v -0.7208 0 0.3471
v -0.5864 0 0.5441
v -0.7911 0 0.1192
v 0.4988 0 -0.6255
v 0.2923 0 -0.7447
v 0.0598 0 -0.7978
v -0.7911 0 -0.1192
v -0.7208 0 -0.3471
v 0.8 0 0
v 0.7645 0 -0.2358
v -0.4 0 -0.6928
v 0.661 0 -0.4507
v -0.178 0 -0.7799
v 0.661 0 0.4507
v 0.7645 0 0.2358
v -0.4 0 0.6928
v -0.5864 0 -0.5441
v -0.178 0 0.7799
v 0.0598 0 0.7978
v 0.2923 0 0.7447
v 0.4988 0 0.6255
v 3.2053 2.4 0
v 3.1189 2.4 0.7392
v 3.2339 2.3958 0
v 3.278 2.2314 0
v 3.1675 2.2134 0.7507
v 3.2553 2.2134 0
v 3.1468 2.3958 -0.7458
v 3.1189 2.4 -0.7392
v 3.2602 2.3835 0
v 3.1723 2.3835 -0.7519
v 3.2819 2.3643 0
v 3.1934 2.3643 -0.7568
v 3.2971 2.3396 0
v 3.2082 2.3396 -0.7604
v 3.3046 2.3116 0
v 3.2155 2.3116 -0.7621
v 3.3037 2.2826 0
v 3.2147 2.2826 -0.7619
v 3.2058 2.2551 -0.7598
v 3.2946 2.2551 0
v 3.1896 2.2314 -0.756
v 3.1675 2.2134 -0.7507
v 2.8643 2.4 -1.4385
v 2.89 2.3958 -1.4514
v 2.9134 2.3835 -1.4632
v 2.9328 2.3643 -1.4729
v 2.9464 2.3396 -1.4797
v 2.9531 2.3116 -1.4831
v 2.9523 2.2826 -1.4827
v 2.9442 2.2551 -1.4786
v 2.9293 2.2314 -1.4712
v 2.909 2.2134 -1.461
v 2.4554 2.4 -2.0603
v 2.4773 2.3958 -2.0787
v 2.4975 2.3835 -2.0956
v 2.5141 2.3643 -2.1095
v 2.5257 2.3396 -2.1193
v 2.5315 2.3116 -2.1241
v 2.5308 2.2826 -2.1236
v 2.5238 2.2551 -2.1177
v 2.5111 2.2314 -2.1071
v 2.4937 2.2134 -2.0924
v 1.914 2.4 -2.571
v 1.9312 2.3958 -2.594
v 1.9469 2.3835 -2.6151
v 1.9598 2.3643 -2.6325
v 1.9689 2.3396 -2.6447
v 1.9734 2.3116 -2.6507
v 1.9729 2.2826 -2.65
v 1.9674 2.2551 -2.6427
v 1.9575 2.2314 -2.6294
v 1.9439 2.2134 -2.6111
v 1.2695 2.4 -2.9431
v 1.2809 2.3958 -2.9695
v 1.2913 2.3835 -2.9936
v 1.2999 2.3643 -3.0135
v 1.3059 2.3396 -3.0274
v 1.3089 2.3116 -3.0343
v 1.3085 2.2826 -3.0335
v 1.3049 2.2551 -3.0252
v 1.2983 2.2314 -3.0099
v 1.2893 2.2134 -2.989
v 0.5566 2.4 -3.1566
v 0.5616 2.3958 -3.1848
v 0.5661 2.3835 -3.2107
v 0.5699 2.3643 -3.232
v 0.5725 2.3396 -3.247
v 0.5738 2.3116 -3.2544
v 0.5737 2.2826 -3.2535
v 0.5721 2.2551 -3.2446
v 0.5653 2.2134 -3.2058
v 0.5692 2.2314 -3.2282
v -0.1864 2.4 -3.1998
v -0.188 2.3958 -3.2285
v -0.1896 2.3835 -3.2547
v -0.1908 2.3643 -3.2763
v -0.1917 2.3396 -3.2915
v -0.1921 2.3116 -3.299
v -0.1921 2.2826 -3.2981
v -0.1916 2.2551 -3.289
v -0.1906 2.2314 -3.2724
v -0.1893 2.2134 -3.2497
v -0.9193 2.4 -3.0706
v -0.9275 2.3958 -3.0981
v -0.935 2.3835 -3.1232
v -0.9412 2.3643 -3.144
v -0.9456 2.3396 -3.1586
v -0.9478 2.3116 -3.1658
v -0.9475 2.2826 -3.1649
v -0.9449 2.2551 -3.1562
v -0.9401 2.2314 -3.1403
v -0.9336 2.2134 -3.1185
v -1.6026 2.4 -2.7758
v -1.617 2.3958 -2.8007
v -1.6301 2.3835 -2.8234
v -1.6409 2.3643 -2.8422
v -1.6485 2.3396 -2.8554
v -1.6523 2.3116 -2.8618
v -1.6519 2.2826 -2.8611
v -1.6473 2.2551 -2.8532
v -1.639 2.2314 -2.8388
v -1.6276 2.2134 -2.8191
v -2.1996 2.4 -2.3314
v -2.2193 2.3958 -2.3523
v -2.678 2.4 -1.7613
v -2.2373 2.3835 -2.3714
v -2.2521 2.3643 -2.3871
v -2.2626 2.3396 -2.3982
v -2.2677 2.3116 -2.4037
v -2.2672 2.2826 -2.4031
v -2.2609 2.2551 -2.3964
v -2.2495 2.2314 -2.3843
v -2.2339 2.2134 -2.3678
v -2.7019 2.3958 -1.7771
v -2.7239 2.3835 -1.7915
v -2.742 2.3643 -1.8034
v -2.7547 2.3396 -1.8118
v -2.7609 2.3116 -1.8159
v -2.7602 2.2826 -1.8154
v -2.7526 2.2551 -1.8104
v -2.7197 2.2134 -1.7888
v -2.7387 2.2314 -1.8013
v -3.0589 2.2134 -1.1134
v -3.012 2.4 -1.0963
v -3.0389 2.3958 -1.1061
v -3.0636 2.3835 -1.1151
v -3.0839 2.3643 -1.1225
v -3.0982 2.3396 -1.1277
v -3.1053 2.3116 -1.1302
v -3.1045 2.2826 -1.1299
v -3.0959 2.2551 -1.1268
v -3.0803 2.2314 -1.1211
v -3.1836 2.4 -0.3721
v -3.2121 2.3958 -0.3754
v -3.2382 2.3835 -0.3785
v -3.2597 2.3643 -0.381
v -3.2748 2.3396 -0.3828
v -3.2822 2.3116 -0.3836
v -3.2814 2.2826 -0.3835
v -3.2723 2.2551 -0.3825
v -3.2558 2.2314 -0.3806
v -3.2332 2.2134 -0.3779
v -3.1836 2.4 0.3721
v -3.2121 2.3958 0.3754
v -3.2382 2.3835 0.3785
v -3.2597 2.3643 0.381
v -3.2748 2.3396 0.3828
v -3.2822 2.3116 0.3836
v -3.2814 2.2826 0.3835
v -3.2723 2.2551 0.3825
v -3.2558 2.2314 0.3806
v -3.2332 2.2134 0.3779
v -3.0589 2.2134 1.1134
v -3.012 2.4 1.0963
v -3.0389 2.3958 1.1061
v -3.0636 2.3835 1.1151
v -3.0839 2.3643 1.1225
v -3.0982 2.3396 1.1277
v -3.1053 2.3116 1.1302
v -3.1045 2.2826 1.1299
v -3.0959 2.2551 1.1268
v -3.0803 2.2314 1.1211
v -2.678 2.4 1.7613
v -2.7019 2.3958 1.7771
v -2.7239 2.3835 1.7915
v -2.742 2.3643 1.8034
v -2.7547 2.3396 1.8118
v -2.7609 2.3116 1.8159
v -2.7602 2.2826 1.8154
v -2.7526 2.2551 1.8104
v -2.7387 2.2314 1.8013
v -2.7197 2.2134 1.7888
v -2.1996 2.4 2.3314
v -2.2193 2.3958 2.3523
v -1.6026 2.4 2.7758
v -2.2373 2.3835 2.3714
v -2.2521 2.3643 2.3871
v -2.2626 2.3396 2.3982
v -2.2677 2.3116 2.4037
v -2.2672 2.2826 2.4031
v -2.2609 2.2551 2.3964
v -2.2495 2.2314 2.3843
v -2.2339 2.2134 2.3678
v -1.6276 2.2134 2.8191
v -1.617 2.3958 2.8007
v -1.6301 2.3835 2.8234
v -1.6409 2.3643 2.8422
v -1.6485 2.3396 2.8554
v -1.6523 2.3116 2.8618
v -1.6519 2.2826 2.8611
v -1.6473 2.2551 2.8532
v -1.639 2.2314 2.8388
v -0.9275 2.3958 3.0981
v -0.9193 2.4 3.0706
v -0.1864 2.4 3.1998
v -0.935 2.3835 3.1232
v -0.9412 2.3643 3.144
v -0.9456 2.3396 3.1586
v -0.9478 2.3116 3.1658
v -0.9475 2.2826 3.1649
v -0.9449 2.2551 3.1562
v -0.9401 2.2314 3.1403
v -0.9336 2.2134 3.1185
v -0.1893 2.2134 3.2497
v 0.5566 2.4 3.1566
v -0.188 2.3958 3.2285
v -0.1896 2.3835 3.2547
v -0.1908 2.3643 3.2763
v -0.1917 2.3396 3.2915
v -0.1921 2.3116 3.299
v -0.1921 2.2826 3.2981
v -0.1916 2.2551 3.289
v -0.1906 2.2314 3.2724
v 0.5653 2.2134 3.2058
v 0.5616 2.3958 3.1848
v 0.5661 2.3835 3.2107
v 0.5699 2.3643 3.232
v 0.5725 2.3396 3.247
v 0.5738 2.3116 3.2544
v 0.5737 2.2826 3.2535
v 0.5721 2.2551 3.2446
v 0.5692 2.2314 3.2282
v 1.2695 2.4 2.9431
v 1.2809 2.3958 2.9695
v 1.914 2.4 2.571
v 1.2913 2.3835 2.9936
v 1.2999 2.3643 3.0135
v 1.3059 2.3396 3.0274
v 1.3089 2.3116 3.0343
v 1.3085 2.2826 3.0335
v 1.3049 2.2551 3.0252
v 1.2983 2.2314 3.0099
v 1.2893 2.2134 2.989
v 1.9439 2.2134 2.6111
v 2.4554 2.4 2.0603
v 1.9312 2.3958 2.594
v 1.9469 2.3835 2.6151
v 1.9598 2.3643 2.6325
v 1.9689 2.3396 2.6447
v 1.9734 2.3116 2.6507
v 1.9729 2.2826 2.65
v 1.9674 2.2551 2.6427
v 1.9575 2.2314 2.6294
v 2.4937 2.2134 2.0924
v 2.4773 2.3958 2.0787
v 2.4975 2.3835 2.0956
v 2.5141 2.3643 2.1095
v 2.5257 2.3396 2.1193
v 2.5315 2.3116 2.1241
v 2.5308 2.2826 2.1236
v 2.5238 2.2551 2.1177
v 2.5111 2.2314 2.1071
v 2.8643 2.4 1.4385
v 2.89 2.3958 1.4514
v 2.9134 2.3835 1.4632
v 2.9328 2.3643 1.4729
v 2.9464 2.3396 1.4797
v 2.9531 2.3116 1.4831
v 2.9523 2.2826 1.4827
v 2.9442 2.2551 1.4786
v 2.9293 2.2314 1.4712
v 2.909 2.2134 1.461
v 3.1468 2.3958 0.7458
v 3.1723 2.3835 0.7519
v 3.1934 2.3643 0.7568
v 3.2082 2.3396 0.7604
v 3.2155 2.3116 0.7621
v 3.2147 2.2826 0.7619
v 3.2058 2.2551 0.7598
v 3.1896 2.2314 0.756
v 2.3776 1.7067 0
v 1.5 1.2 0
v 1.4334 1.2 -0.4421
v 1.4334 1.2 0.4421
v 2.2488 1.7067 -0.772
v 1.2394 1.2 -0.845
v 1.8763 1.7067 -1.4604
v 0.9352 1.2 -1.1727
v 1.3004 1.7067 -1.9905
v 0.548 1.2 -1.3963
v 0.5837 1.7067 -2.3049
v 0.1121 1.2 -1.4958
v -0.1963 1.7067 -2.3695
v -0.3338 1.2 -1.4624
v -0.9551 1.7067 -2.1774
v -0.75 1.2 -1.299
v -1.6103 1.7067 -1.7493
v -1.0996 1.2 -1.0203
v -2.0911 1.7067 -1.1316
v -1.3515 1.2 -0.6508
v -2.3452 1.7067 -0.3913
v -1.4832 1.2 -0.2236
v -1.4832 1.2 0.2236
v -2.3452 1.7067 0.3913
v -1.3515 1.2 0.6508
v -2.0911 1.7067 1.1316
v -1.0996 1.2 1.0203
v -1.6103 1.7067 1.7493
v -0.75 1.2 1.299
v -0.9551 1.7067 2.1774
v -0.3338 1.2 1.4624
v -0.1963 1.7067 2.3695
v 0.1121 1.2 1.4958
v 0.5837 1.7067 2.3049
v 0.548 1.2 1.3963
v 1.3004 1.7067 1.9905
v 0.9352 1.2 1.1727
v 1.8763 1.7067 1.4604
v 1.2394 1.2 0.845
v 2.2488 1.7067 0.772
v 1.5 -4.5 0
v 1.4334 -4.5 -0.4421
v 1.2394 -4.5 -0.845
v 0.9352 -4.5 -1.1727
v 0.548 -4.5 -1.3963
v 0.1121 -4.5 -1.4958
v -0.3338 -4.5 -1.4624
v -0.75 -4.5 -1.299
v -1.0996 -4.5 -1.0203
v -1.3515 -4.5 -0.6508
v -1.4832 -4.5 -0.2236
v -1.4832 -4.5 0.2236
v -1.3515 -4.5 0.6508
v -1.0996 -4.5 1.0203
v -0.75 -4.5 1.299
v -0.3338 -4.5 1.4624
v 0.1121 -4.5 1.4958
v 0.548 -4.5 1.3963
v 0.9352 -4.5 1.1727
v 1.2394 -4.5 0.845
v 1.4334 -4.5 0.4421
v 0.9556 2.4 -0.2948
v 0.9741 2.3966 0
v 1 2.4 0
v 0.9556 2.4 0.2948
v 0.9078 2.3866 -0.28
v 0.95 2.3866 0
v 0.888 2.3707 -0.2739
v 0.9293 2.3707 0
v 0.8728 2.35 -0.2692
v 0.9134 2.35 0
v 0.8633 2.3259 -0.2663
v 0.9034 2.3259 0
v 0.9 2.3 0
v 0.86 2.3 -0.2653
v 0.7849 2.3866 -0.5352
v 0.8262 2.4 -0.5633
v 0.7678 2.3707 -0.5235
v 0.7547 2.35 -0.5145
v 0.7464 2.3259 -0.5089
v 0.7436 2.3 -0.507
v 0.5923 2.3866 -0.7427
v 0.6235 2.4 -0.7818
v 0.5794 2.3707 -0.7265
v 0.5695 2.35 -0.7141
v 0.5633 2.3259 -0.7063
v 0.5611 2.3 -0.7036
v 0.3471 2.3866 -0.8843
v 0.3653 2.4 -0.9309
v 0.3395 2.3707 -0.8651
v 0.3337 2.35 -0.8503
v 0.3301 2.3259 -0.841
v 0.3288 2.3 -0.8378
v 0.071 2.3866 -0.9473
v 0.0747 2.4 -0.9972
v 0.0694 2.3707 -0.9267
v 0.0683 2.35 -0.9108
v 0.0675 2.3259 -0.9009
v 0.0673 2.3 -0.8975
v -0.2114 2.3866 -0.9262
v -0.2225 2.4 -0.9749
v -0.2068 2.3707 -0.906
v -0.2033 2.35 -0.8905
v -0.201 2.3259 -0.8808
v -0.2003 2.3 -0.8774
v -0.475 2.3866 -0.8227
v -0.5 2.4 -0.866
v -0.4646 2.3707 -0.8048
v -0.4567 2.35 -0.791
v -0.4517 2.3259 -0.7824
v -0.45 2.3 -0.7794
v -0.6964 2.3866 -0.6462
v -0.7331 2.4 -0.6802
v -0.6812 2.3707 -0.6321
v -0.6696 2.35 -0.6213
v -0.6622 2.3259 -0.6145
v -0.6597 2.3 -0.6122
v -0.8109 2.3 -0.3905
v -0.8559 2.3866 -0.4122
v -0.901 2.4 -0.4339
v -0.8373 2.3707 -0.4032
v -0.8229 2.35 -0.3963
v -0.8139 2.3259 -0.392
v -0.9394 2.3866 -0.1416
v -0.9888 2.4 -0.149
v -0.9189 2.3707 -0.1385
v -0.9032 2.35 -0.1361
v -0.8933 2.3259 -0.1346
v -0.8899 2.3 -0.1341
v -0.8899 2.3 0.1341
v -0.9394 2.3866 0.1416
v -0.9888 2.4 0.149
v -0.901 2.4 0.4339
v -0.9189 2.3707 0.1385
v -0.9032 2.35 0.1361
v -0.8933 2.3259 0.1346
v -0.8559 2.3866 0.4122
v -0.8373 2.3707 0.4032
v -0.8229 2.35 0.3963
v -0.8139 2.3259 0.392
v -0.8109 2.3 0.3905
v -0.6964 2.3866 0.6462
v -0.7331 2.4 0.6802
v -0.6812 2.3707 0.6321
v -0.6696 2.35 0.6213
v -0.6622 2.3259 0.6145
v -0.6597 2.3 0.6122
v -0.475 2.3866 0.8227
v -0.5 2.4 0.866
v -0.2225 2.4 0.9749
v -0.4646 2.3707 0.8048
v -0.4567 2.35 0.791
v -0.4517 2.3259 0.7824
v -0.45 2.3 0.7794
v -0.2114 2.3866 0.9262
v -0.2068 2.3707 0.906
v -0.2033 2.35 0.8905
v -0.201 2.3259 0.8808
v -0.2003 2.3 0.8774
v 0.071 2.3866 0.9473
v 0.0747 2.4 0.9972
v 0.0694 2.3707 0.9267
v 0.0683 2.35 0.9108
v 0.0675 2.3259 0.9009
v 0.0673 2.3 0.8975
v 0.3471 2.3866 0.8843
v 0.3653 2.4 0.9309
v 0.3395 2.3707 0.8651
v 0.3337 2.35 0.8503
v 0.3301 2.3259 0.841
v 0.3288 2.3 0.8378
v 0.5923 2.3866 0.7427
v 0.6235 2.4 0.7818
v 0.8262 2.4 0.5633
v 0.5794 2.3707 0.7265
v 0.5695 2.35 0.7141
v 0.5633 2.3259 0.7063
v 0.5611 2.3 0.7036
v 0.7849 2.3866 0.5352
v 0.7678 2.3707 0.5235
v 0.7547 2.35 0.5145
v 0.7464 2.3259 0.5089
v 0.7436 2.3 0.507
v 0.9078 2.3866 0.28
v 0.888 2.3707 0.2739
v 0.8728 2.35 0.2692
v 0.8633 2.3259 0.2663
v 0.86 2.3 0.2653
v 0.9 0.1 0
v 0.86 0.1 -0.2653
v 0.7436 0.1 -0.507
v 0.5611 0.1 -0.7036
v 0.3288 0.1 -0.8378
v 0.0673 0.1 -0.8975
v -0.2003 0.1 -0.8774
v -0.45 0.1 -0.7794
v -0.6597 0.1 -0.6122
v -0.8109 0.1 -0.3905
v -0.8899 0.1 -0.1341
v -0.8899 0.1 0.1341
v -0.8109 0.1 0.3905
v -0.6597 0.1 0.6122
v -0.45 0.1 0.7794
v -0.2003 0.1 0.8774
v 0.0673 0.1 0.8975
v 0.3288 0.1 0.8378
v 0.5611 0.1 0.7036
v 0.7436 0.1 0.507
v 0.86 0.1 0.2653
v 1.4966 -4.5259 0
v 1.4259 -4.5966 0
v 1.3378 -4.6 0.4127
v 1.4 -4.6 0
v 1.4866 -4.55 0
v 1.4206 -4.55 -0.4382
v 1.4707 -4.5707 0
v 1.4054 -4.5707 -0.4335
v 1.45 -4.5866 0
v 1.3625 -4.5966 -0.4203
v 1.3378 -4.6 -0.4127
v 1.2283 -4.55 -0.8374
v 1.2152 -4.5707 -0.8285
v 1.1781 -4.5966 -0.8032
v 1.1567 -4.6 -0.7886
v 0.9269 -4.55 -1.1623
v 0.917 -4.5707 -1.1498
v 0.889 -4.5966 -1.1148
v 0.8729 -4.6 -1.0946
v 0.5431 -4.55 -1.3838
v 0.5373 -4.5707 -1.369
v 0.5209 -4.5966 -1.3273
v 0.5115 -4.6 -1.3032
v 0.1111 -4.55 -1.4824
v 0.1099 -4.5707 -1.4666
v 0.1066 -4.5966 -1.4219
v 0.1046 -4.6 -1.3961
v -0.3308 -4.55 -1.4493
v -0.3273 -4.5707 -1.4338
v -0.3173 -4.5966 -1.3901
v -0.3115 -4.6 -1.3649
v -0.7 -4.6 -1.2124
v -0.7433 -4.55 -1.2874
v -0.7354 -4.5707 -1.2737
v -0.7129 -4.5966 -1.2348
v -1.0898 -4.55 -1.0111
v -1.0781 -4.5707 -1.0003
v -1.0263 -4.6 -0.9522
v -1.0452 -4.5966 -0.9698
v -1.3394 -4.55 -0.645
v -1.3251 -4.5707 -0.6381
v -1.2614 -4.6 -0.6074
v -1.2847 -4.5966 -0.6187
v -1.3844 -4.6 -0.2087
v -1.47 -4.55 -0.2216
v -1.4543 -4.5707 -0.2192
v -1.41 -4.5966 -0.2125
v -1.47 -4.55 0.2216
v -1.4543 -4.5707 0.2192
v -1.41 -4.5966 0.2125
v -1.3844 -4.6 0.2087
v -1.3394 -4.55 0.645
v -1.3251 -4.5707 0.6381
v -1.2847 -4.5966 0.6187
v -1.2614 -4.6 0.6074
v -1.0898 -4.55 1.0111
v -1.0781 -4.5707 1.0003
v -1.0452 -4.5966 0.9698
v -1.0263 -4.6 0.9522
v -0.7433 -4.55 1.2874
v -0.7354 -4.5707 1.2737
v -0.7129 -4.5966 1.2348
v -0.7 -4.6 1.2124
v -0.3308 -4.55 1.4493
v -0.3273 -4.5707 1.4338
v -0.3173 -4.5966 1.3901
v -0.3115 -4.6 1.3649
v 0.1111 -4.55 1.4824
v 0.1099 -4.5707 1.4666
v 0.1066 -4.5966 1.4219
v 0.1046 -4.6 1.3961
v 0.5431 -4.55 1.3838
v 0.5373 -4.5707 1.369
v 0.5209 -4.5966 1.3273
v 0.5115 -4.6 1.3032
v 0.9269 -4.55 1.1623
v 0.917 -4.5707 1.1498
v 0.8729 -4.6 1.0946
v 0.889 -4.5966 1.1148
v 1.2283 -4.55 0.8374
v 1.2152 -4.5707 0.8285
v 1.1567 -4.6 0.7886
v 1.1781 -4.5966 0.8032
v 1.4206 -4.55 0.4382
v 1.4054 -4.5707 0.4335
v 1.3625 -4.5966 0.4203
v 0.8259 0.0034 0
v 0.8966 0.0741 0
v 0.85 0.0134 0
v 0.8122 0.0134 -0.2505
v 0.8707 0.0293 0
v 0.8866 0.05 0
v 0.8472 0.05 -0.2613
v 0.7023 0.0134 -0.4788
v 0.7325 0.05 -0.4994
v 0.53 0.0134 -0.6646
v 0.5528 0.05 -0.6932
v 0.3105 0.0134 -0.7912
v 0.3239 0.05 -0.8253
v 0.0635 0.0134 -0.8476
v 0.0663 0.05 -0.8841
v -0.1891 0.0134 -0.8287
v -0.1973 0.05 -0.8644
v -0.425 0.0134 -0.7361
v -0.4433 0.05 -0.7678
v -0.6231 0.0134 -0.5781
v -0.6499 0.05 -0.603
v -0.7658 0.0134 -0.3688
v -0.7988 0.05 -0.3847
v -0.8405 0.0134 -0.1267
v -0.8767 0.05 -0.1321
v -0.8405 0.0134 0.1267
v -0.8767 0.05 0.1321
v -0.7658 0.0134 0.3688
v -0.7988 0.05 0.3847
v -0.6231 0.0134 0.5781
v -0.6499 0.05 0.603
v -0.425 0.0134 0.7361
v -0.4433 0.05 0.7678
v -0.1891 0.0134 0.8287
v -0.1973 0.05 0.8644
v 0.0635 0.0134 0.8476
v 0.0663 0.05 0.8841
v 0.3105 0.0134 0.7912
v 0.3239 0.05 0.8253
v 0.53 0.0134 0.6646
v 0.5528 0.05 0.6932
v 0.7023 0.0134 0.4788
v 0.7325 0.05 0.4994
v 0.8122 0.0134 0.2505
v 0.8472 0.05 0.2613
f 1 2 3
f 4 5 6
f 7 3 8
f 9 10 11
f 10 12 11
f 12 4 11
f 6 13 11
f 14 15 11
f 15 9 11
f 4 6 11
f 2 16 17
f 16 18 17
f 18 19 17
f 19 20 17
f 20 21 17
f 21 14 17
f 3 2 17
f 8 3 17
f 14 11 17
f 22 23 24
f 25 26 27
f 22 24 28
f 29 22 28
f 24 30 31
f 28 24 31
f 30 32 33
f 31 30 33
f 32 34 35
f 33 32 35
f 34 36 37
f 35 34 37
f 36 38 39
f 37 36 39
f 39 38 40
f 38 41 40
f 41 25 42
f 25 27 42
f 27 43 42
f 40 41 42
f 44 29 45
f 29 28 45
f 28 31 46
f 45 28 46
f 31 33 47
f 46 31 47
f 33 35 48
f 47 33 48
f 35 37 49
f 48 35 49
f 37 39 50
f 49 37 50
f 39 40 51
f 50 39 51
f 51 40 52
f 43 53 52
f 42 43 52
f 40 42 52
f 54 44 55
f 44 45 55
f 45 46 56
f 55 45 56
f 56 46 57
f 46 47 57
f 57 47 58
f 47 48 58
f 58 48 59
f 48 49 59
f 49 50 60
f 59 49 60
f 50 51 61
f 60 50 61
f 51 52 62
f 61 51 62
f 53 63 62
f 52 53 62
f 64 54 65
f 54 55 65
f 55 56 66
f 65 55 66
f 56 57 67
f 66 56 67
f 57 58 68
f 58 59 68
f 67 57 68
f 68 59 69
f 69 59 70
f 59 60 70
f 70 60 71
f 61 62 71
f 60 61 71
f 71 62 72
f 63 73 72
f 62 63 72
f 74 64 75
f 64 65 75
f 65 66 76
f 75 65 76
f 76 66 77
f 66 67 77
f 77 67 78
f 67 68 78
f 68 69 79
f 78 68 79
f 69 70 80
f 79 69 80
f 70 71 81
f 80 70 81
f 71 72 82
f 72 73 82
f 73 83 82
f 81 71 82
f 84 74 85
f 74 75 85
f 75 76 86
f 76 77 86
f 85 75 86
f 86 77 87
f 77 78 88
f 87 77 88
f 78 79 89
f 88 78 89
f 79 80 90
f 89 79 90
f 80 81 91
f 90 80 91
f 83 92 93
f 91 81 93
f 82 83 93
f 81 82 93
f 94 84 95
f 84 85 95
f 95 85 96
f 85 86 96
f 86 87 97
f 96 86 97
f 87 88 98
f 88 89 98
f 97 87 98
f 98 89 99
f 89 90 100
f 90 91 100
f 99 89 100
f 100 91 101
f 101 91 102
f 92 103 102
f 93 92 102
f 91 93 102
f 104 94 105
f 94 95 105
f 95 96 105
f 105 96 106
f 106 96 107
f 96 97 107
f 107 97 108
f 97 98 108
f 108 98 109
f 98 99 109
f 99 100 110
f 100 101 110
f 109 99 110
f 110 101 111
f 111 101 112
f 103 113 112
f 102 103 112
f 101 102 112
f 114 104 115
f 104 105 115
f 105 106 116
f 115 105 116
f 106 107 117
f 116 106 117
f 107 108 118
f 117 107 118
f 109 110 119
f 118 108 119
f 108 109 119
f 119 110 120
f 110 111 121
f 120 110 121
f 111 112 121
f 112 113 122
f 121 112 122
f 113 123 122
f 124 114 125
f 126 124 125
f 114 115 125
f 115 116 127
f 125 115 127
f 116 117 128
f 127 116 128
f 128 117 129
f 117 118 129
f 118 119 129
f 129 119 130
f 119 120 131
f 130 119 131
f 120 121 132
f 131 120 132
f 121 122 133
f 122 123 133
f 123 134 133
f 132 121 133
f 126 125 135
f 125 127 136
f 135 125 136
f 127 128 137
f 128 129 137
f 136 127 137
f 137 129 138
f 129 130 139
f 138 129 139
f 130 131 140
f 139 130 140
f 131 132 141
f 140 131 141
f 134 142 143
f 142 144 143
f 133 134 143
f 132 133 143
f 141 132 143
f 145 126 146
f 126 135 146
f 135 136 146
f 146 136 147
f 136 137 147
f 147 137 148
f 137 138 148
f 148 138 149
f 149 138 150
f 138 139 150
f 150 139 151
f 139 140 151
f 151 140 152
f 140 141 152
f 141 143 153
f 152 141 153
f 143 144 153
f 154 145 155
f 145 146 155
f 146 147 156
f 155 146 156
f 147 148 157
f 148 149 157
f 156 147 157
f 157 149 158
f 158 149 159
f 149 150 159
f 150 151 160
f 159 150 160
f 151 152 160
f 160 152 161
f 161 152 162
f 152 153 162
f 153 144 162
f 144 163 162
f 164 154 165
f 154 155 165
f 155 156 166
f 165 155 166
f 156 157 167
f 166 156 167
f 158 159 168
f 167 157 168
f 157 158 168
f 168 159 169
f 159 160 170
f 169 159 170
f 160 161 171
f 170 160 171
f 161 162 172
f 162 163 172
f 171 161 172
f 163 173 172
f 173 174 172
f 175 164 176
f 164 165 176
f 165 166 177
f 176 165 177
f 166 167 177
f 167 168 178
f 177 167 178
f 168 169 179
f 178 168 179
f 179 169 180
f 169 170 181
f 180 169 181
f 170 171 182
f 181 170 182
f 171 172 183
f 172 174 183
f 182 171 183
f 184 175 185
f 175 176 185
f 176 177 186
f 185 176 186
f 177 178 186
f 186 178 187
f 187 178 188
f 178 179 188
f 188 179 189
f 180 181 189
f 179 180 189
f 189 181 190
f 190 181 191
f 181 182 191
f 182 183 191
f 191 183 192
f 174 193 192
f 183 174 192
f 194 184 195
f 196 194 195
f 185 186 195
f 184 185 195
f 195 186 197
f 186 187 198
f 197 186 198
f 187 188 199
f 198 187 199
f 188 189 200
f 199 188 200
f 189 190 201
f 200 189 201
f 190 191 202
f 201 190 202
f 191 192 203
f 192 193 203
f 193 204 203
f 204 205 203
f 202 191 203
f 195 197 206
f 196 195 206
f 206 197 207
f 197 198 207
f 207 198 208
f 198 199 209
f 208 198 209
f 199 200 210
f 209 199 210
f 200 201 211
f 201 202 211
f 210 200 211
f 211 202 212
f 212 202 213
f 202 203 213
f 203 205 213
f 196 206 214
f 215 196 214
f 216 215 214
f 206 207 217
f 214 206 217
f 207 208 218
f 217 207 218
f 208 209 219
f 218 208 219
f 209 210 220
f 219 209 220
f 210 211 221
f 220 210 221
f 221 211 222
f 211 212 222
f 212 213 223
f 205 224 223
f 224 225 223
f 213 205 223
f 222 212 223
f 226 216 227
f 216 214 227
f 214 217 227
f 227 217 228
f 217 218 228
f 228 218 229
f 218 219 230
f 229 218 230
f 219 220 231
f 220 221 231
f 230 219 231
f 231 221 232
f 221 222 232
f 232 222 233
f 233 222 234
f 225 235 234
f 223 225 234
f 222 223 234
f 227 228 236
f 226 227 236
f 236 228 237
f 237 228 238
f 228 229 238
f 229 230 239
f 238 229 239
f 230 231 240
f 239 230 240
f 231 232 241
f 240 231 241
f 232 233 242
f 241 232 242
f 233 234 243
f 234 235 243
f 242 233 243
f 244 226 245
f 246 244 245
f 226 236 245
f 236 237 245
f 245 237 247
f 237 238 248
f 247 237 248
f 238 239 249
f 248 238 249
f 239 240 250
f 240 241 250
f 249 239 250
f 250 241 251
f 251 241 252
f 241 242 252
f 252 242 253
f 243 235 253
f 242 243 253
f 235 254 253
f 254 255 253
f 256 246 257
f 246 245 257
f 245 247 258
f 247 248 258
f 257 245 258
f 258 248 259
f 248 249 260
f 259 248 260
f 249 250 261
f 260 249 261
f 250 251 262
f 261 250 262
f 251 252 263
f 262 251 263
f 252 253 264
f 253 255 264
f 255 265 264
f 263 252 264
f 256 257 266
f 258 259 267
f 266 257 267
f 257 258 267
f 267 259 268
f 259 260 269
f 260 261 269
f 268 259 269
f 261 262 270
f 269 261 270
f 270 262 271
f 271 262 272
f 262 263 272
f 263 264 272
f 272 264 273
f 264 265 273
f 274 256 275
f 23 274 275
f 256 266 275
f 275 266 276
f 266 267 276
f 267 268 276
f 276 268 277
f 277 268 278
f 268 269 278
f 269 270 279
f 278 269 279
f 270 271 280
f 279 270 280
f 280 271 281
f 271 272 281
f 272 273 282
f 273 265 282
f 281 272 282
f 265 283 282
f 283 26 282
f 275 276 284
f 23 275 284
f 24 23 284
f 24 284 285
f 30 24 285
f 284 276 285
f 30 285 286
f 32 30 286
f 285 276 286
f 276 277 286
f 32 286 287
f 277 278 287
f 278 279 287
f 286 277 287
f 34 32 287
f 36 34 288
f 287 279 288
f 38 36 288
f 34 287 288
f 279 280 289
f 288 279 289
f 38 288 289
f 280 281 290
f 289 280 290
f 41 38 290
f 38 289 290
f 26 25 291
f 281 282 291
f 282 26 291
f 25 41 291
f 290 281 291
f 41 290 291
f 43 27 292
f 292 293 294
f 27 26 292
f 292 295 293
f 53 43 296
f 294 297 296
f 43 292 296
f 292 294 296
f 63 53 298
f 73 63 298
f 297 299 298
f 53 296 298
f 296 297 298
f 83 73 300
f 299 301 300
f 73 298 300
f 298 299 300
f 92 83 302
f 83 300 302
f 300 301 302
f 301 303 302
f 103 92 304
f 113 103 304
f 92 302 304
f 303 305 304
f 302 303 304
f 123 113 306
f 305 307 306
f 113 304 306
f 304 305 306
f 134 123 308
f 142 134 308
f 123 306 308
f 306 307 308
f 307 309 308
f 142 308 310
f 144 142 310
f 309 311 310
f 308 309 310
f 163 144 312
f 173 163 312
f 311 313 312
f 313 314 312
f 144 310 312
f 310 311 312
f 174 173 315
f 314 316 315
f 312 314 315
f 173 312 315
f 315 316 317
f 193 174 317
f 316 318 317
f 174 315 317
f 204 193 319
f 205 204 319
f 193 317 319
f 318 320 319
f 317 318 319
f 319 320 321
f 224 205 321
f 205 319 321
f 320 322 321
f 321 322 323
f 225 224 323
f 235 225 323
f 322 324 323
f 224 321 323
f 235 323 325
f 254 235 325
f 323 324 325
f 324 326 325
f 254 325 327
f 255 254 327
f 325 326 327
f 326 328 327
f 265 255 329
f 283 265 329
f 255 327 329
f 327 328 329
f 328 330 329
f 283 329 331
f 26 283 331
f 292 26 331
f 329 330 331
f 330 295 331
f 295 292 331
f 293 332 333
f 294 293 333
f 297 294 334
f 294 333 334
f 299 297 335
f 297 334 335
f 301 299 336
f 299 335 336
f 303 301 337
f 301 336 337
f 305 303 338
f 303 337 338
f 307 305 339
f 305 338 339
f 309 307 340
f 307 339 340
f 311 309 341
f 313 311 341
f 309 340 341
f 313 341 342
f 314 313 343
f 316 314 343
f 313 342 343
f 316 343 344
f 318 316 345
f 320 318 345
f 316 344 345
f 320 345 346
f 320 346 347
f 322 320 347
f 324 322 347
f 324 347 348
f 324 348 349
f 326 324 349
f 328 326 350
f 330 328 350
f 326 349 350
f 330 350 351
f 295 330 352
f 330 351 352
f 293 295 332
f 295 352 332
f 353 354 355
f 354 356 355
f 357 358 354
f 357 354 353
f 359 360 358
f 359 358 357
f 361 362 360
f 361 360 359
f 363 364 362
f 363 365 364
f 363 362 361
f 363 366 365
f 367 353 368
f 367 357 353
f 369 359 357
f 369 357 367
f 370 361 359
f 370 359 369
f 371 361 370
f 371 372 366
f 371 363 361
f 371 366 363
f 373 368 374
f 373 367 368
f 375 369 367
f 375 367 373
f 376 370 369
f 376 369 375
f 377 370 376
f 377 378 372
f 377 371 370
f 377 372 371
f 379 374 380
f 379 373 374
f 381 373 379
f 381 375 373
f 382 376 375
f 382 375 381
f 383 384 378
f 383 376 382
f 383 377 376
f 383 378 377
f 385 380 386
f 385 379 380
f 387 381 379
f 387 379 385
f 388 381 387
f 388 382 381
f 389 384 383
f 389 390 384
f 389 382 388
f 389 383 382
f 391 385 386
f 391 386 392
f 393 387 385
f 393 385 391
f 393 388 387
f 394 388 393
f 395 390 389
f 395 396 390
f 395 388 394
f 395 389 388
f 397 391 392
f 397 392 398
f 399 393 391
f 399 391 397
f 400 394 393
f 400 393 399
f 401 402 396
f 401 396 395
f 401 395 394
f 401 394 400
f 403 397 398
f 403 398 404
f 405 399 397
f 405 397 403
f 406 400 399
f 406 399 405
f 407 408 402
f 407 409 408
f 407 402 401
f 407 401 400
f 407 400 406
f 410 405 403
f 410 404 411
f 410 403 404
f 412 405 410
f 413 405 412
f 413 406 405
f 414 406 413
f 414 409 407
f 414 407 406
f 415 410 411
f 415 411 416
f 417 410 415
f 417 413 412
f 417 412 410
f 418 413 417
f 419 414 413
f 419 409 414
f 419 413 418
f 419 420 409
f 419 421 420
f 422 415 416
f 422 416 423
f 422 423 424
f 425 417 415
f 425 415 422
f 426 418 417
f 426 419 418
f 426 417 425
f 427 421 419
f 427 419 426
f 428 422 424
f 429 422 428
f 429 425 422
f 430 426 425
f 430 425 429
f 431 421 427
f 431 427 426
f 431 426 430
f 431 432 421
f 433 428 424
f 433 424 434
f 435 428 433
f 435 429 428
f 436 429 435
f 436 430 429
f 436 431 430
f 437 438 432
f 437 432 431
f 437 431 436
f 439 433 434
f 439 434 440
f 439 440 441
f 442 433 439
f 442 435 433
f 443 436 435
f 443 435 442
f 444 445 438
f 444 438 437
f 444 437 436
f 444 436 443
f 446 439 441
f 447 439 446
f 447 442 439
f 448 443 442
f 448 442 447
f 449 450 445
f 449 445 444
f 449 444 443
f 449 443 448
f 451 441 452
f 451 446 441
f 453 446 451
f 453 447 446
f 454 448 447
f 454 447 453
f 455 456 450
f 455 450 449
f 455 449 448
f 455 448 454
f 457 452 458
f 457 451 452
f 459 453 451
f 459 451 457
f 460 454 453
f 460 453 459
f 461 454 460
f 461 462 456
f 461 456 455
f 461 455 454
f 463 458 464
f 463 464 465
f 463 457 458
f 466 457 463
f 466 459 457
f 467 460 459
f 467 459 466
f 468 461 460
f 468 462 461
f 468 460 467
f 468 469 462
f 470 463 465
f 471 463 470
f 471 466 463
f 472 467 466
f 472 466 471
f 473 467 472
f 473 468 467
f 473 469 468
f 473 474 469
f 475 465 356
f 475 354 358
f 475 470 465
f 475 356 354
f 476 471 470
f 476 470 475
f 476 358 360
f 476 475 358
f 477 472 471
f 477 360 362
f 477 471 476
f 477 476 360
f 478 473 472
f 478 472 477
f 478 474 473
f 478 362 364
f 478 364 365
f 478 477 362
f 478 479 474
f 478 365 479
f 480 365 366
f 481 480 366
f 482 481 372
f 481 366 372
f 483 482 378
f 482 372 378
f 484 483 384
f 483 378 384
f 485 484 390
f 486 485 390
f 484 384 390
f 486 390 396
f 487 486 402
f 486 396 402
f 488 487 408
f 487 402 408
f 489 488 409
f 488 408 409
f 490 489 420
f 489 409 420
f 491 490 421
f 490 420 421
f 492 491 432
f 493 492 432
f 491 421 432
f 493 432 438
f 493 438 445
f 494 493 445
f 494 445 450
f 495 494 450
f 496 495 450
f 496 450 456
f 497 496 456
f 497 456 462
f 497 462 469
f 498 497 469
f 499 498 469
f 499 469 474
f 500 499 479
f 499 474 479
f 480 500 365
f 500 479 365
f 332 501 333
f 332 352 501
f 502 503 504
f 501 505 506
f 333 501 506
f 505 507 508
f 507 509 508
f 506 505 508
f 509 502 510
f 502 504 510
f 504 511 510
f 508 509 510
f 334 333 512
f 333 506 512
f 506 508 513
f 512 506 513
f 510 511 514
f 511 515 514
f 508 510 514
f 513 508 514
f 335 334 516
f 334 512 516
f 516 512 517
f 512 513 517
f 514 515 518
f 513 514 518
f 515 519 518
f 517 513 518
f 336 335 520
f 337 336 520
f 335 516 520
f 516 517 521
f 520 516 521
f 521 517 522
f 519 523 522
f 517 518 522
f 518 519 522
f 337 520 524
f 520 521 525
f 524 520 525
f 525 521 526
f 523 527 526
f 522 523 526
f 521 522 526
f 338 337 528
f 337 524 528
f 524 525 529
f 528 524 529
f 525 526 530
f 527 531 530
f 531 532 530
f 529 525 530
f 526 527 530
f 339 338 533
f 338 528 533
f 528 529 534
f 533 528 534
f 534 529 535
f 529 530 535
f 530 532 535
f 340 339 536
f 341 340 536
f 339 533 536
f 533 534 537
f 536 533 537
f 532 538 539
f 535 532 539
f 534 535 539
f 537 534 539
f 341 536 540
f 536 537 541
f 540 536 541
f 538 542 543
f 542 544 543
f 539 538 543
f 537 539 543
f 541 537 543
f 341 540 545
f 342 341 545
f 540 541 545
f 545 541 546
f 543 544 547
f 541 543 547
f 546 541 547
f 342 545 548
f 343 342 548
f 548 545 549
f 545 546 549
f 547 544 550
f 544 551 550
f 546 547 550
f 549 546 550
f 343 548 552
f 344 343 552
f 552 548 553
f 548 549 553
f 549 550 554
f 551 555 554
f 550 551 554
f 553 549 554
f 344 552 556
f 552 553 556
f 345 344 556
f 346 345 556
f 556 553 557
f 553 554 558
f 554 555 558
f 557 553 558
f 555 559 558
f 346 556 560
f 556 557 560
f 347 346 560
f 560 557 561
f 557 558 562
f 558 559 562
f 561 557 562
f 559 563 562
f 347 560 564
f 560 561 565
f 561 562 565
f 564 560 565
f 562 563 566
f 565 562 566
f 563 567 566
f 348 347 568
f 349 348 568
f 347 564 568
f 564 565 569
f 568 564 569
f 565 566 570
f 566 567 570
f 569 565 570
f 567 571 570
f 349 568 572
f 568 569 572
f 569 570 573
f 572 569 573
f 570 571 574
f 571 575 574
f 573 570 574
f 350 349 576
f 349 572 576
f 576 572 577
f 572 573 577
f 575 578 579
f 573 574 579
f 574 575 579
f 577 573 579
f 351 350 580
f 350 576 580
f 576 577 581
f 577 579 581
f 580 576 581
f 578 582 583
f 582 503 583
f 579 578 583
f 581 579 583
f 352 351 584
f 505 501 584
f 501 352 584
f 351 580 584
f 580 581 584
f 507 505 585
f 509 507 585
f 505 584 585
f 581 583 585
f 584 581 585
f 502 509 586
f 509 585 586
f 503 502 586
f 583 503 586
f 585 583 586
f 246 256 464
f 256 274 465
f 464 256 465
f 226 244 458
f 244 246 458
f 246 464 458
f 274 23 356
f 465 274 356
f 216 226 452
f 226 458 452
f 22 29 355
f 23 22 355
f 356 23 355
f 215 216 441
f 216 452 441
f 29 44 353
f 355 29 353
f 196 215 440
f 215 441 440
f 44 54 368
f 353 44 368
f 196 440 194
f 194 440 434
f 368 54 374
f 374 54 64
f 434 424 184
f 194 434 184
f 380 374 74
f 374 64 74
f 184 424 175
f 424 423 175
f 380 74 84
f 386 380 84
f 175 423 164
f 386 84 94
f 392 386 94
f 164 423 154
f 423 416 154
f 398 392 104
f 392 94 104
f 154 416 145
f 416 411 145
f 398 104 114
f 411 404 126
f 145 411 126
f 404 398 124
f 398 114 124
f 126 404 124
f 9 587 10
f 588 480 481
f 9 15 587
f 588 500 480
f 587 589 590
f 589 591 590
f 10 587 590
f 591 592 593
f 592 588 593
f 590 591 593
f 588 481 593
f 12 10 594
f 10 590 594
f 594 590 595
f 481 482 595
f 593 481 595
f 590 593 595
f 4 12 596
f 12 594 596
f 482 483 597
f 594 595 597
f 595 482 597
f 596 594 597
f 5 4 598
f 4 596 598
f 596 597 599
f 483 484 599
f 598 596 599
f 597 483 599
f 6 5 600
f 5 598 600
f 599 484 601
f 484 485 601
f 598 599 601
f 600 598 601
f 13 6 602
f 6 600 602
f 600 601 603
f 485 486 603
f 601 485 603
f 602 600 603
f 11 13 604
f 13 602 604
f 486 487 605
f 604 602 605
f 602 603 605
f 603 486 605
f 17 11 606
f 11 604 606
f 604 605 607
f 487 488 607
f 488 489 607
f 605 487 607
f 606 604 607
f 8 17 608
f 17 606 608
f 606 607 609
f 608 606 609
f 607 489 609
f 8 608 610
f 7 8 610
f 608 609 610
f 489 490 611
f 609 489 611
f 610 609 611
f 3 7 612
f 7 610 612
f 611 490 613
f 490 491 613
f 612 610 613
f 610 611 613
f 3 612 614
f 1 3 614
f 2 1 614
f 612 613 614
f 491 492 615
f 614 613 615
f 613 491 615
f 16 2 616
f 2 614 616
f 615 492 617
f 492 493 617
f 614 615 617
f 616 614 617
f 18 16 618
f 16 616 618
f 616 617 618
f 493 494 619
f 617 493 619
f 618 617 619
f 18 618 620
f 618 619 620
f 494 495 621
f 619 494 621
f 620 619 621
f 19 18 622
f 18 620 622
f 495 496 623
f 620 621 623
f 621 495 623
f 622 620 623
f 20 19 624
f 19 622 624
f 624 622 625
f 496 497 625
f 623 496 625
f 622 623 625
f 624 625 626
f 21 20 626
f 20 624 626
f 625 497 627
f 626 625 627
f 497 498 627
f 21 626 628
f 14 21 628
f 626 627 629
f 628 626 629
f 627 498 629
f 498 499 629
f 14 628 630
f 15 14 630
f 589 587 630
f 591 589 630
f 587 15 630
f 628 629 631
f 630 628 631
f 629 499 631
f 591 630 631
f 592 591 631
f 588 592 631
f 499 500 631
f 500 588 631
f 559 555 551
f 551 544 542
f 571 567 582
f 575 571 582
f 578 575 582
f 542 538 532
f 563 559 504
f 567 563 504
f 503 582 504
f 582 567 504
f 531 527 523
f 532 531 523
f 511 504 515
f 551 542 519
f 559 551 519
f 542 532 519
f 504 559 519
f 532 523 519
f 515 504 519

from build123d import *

# Parameters (mm, degrees)
FILLET_1_R = 0.1


with BuildPart() as part:
    # 草图1 → 旋转1 (revolve)
    with BuildSketch(Plane.XY, mode=Mode.PRIVATE) as revolve_1_sk:
        Polygon((-0.9, 2.4), (-3.578460969, 2.4), (-1.5, 1.2), (-1.5, -4.6), (0, -4.6), (0, 0), (-0.9, 0), align=None)
    revolve(revolve_1_sk.sketch.rotate(Axis((0, -4.6, 0), (0, 1, 0)), 180), axis=Axis((0, -4.6, 0), (0, 1, 0)))

    # 圆角1
    fillet_1_edges = [part.edges().sort_by_distance(p)[0] for p in [
        (-0.9, 0, 0),
        (-1.5, -4.6, 0),
        (-3.578460969, 2.4, 0),
        (-0.9, 2.4, 0),
    ]]
    fillet(fillet_1_edges, radius=FILLET_1_R)


solid = part.part
